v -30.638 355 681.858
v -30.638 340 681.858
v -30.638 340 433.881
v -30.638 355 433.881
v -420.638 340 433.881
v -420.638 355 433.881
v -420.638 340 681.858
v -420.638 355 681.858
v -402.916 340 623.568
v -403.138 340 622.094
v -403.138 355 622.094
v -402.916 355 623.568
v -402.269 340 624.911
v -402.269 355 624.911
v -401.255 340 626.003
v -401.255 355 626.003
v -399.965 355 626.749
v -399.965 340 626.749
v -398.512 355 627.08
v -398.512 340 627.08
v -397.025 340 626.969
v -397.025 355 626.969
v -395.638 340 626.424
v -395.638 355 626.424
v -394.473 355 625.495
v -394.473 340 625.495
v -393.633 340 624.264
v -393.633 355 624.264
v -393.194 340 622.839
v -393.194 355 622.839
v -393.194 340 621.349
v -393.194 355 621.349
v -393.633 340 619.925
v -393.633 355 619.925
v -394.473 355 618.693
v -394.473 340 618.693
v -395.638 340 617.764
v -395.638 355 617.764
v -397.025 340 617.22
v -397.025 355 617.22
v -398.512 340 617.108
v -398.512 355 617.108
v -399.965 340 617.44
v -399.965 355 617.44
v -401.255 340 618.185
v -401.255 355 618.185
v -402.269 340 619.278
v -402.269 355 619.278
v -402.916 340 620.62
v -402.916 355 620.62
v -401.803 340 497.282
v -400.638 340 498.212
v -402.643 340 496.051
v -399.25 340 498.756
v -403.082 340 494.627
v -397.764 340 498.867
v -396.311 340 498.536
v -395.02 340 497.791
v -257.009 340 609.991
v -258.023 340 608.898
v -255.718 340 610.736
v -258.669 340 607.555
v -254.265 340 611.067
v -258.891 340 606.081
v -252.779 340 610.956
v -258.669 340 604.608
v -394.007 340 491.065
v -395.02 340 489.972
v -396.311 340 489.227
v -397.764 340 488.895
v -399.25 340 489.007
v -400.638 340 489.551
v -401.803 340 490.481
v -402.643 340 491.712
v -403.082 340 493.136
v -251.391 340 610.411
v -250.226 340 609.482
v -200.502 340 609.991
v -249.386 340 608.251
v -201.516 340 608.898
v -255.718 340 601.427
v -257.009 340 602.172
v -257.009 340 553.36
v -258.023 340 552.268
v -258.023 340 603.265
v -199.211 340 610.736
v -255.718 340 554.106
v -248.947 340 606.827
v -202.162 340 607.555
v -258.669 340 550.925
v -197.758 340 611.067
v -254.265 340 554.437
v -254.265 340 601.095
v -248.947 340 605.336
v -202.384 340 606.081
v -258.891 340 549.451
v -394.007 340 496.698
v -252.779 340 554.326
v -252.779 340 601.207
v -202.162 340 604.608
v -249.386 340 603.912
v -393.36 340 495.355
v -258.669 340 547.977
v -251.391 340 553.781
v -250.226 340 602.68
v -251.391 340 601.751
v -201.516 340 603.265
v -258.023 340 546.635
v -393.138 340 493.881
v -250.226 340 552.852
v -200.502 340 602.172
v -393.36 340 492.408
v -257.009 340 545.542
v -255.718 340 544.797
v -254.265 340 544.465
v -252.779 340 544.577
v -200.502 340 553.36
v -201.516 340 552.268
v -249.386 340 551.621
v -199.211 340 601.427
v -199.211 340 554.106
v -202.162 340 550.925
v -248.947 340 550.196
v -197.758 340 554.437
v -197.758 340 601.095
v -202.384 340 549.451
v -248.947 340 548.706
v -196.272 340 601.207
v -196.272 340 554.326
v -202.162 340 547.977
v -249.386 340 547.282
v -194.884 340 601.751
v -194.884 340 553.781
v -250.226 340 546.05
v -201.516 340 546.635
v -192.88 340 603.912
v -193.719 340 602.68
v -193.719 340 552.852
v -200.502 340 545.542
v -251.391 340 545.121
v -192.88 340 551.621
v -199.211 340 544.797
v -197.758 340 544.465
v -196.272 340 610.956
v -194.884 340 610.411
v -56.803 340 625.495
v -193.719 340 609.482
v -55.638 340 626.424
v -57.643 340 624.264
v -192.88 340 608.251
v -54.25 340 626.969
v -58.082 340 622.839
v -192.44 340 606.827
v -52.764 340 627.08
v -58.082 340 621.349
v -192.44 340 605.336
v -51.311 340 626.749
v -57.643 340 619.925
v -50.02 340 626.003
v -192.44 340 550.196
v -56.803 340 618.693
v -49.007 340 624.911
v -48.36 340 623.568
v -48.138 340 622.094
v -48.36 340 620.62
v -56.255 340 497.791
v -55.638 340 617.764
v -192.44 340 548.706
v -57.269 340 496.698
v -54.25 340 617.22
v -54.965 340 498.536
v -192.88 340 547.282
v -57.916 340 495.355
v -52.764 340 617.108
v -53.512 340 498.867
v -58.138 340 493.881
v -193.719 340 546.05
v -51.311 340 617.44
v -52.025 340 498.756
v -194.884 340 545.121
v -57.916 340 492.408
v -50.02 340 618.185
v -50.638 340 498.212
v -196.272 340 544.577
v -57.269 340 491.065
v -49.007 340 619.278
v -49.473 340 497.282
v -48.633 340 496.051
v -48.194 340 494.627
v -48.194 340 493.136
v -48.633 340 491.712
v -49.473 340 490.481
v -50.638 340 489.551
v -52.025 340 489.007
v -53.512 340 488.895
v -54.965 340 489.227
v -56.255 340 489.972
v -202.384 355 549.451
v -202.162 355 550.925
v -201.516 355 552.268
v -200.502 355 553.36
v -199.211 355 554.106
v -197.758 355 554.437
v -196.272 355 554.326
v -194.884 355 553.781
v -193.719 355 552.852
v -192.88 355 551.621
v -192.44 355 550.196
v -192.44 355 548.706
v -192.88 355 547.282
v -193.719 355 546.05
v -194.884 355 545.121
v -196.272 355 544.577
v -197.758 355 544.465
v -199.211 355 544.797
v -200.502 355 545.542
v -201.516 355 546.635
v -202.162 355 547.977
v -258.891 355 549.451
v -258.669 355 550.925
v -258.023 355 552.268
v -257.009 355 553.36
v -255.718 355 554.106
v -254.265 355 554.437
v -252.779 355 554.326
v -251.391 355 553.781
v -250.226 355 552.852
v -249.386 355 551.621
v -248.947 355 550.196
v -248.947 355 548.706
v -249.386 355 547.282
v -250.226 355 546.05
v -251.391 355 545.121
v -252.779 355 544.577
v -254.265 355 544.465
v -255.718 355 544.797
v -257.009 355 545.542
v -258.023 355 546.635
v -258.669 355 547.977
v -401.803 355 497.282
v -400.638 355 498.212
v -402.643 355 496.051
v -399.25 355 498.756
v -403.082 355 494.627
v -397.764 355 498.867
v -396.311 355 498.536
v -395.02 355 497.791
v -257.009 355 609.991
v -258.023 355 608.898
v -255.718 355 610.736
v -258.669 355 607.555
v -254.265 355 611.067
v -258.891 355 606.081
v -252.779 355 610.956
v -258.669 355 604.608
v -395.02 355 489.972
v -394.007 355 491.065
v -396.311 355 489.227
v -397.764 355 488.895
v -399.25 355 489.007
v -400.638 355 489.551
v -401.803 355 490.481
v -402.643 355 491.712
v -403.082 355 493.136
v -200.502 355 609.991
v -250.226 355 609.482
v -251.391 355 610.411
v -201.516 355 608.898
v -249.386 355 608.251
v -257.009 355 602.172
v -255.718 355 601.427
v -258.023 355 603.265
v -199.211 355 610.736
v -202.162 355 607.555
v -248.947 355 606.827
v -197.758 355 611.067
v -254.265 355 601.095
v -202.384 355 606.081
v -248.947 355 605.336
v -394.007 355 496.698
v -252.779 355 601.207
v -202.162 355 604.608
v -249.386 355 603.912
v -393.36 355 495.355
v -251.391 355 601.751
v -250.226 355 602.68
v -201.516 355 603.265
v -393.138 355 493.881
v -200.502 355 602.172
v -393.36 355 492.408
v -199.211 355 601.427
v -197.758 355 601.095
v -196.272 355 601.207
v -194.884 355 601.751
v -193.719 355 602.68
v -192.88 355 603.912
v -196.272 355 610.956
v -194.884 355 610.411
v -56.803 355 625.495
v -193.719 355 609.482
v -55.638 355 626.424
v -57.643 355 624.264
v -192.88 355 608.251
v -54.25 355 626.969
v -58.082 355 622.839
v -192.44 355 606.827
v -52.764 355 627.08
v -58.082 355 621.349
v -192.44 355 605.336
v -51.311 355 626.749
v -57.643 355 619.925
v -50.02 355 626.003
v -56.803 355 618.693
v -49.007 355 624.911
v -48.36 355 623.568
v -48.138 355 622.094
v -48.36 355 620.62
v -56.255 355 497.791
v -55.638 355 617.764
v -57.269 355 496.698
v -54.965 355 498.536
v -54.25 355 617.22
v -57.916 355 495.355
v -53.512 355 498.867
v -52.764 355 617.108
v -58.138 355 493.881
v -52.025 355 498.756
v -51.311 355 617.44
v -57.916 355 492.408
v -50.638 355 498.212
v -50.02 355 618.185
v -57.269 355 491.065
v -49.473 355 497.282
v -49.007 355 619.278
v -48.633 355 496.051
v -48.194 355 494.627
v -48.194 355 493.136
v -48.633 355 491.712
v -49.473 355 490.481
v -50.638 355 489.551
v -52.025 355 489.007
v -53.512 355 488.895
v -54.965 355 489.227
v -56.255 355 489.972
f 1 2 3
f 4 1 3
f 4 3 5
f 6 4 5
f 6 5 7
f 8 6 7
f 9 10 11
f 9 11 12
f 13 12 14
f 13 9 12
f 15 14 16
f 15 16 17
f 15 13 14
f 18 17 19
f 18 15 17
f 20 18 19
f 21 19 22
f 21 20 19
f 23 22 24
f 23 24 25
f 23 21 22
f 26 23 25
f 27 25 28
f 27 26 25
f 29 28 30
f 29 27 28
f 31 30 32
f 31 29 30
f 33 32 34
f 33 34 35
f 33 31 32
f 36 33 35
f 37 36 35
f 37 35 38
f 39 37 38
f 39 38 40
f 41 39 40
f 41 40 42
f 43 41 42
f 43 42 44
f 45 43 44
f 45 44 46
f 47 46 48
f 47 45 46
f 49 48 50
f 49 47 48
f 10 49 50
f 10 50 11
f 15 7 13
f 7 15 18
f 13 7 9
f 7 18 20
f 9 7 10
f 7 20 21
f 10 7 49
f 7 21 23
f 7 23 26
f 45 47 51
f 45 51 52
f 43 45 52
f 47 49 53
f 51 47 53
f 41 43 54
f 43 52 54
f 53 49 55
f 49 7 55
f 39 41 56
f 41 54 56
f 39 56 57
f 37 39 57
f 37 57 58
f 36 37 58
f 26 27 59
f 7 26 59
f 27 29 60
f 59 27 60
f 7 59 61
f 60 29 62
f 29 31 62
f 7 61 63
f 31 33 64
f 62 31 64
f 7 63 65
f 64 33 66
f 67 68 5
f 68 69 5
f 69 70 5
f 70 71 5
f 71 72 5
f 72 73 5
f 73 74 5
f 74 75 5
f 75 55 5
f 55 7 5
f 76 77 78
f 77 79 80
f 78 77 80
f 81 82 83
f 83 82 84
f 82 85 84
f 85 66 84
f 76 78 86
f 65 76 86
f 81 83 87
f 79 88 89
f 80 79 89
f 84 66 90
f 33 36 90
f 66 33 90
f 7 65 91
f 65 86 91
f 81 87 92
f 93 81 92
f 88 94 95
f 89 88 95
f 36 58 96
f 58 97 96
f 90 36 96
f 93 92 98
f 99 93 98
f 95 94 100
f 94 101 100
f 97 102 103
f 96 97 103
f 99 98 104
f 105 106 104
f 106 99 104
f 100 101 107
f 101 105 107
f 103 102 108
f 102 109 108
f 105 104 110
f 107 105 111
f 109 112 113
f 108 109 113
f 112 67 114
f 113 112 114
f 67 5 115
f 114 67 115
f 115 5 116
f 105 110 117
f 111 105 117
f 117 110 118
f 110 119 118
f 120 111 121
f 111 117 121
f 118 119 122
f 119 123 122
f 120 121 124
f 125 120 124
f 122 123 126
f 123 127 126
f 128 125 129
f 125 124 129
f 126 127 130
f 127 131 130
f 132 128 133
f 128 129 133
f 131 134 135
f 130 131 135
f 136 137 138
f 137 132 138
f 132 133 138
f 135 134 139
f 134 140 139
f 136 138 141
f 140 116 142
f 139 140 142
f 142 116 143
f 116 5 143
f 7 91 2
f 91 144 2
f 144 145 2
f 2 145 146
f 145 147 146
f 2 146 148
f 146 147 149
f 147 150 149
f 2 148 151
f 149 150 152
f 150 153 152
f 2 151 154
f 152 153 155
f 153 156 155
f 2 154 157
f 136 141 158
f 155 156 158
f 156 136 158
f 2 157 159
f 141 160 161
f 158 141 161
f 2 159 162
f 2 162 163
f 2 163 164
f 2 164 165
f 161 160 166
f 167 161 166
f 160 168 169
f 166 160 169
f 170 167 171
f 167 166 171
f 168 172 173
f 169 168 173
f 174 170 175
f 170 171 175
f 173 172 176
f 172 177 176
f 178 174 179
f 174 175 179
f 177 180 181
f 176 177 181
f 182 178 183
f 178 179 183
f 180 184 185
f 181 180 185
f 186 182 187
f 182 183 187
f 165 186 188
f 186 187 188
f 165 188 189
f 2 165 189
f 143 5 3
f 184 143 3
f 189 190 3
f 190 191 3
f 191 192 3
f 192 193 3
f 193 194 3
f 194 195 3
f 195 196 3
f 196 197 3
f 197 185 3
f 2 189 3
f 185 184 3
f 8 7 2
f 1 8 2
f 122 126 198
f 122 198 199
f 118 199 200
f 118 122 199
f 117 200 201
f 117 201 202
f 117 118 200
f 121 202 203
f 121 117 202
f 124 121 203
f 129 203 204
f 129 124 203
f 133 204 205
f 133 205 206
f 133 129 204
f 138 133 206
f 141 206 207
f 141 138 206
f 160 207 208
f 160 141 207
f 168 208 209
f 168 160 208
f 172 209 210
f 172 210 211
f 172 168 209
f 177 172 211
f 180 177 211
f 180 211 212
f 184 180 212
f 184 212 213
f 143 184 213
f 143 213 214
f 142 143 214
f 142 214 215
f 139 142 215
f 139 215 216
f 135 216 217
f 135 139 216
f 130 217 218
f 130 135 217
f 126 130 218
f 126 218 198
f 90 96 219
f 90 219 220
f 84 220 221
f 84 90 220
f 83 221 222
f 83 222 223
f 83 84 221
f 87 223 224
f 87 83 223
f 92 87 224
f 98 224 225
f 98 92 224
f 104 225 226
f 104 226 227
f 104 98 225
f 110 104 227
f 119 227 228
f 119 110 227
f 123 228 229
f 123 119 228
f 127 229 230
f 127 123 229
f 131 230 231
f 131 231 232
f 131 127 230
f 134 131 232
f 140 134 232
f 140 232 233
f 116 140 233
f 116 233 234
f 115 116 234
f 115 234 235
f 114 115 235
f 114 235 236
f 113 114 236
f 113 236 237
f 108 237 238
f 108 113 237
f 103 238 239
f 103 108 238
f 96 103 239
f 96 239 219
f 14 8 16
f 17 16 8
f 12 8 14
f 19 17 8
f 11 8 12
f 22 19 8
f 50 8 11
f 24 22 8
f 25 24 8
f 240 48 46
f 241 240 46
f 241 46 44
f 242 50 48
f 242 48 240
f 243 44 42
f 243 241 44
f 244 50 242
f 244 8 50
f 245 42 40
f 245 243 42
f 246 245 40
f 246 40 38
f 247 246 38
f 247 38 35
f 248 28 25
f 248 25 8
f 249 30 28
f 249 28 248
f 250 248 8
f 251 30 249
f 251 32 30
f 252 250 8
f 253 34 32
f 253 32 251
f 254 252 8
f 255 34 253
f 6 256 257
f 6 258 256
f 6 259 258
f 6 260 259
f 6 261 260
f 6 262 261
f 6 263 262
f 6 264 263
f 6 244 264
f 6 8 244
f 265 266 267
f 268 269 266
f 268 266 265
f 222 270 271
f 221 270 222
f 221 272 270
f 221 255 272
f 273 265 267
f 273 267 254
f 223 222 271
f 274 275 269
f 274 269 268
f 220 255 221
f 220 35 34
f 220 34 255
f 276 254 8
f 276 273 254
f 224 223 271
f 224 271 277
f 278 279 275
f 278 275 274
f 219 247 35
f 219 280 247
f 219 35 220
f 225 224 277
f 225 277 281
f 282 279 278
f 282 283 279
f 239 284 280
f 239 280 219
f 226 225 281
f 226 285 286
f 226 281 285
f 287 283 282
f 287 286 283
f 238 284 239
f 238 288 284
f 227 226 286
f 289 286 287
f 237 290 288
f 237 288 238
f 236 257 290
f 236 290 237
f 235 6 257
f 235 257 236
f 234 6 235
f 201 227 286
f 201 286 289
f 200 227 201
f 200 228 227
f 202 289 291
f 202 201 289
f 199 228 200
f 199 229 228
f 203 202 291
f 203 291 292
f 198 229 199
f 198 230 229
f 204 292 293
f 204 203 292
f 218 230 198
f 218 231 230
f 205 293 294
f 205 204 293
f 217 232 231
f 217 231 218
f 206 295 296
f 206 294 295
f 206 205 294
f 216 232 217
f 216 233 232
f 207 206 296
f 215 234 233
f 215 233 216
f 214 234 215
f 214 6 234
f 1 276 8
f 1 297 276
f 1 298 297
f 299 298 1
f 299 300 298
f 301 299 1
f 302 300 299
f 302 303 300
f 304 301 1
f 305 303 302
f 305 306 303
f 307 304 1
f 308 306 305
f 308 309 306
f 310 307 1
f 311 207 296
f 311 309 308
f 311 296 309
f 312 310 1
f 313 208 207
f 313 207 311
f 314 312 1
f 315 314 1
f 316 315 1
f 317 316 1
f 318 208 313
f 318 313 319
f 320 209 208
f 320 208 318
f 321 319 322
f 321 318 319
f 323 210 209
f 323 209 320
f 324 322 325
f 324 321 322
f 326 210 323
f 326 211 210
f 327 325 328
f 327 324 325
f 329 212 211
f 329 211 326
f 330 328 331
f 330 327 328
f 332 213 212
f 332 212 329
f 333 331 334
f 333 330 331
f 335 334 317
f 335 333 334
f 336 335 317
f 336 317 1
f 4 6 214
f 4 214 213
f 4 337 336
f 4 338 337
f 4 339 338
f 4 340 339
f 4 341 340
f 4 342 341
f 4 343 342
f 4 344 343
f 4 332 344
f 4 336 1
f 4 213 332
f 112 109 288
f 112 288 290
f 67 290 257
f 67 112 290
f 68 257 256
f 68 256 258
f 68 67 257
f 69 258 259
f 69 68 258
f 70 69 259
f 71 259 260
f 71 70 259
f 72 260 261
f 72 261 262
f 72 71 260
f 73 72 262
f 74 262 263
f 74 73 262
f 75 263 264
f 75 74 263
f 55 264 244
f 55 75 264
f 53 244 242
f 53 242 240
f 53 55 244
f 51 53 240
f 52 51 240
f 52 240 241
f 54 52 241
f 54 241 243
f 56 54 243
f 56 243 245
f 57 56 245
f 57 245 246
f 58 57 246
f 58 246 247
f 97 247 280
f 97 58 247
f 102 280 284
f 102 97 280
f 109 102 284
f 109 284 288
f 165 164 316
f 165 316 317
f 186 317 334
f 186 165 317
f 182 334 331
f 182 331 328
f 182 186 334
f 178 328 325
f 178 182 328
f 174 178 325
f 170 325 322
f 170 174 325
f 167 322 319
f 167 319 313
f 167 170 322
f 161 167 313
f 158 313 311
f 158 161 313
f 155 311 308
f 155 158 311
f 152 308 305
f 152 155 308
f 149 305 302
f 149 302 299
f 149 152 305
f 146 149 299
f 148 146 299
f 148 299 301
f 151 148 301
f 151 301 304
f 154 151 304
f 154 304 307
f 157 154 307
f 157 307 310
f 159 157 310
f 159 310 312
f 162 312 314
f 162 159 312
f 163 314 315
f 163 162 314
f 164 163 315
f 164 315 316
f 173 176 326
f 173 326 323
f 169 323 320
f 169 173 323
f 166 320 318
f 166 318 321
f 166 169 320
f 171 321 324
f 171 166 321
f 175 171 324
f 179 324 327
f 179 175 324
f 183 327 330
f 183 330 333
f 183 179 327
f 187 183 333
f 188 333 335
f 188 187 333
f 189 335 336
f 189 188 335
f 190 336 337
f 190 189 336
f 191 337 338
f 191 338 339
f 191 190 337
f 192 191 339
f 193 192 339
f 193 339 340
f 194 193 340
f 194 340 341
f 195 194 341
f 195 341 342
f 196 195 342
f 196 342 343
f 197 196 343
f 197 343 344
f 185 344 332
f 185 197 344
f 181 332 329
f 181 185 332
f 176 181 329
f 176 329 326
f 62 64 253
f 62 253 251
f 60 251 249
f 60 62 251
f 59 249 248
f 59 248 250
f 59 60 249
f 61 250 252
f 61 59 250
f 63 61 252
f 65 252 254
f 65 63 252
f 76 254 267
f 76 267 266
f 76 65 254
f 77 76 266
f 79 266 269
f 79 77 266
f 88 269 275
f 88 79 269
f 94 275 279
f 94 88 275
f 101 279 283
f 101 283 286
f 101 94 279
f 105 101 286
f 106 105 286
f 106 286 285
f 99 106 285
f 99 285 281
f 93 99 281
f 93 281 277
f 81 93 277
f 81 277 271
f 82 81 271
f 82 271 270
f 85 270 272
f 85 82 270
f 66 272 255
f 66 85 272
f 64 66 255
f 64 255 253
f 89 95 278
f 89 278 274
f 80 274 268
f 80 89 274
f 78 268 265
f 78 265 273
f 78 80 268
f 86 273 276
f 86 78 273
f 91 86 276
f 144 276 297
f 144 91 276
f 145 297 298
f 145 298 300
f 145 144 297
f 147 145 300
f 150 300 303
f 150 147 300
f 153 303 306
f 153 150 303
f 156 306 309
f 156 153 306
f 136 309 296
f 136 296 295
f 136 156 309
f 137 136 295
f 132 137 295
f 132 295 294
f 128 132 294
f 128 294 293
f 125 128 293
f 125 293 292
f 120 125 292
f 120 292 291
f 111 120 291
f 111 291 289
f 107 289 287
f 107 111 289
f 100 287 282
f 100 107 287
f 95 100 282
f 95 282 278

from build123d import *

# Parameters (mm, degrees)
SKETCH2_R           = 5
BOSS_EXTRUDE1_DEPTH = 15


with BuildPart() as part:
    # Sketch2 → Boss-Extrude1 (new body)
    with BuildSketch(Plane(origin=(0, 340, 0), x_dir=(1, 0, 0), z_dir=(0, 1, 0))):
        Polygon((-420.637885724, -681.858342538), (-30.637885724, -681.858342538), (-30.637885724, -455.858342538), (-30.637885724, -433.881423439), (-420.637885724, -433.881423439), (-420.637885724, -455.858342538), align=None)
        with Locations(Location((-53.137885724, -493.881423439, 0), (0, 0, 180))):
            Circle(SKETCH2_R, mode=Mode.SUBTRACT)
        with Locations((-53.137885724, -622.094154379)):
            Circle(SKETCH2_R, mode=Mode.SUBTRACT)
        with Locations((-398.137885724, -493.881423439)):
            Circle(SKETCH2_R, mode=Mode.SUBTRACT)
        with Locations(Location((-398.137885724, -622.094154379, 0), (0, 0, 180))):
            Circle(SKETCH2_R, mode=Mode.SUBTRACT)
        with Locations(Location((-197.384432093, -549.451182731, 0), (0, 0, 180))):
            Circle(SKETCH2_R, mode=Mode.SUBTRACT)
        with Locations(Location((-197.384432093, -606.081360459, 0), (0, 0, 180))):
            Circle(SKETCH2_R, mode=Mode.SUBTRACT)
        with Locations(Location((-253.891339355, -606.081360459, 0), (0, 0, 180))):
            Circle(SKETCH2_R, mode=Mode.SUBTRACT)
        with Locations(Location((-253.891339355, -549.451182731, 0), (0, 0, 180))):
            Circle(SKETCH2_R, mode=Mode.SUBTRACT)
    extrude(amount=BOSS_EXTRUDE1_DEPTH)


solid = part.part
